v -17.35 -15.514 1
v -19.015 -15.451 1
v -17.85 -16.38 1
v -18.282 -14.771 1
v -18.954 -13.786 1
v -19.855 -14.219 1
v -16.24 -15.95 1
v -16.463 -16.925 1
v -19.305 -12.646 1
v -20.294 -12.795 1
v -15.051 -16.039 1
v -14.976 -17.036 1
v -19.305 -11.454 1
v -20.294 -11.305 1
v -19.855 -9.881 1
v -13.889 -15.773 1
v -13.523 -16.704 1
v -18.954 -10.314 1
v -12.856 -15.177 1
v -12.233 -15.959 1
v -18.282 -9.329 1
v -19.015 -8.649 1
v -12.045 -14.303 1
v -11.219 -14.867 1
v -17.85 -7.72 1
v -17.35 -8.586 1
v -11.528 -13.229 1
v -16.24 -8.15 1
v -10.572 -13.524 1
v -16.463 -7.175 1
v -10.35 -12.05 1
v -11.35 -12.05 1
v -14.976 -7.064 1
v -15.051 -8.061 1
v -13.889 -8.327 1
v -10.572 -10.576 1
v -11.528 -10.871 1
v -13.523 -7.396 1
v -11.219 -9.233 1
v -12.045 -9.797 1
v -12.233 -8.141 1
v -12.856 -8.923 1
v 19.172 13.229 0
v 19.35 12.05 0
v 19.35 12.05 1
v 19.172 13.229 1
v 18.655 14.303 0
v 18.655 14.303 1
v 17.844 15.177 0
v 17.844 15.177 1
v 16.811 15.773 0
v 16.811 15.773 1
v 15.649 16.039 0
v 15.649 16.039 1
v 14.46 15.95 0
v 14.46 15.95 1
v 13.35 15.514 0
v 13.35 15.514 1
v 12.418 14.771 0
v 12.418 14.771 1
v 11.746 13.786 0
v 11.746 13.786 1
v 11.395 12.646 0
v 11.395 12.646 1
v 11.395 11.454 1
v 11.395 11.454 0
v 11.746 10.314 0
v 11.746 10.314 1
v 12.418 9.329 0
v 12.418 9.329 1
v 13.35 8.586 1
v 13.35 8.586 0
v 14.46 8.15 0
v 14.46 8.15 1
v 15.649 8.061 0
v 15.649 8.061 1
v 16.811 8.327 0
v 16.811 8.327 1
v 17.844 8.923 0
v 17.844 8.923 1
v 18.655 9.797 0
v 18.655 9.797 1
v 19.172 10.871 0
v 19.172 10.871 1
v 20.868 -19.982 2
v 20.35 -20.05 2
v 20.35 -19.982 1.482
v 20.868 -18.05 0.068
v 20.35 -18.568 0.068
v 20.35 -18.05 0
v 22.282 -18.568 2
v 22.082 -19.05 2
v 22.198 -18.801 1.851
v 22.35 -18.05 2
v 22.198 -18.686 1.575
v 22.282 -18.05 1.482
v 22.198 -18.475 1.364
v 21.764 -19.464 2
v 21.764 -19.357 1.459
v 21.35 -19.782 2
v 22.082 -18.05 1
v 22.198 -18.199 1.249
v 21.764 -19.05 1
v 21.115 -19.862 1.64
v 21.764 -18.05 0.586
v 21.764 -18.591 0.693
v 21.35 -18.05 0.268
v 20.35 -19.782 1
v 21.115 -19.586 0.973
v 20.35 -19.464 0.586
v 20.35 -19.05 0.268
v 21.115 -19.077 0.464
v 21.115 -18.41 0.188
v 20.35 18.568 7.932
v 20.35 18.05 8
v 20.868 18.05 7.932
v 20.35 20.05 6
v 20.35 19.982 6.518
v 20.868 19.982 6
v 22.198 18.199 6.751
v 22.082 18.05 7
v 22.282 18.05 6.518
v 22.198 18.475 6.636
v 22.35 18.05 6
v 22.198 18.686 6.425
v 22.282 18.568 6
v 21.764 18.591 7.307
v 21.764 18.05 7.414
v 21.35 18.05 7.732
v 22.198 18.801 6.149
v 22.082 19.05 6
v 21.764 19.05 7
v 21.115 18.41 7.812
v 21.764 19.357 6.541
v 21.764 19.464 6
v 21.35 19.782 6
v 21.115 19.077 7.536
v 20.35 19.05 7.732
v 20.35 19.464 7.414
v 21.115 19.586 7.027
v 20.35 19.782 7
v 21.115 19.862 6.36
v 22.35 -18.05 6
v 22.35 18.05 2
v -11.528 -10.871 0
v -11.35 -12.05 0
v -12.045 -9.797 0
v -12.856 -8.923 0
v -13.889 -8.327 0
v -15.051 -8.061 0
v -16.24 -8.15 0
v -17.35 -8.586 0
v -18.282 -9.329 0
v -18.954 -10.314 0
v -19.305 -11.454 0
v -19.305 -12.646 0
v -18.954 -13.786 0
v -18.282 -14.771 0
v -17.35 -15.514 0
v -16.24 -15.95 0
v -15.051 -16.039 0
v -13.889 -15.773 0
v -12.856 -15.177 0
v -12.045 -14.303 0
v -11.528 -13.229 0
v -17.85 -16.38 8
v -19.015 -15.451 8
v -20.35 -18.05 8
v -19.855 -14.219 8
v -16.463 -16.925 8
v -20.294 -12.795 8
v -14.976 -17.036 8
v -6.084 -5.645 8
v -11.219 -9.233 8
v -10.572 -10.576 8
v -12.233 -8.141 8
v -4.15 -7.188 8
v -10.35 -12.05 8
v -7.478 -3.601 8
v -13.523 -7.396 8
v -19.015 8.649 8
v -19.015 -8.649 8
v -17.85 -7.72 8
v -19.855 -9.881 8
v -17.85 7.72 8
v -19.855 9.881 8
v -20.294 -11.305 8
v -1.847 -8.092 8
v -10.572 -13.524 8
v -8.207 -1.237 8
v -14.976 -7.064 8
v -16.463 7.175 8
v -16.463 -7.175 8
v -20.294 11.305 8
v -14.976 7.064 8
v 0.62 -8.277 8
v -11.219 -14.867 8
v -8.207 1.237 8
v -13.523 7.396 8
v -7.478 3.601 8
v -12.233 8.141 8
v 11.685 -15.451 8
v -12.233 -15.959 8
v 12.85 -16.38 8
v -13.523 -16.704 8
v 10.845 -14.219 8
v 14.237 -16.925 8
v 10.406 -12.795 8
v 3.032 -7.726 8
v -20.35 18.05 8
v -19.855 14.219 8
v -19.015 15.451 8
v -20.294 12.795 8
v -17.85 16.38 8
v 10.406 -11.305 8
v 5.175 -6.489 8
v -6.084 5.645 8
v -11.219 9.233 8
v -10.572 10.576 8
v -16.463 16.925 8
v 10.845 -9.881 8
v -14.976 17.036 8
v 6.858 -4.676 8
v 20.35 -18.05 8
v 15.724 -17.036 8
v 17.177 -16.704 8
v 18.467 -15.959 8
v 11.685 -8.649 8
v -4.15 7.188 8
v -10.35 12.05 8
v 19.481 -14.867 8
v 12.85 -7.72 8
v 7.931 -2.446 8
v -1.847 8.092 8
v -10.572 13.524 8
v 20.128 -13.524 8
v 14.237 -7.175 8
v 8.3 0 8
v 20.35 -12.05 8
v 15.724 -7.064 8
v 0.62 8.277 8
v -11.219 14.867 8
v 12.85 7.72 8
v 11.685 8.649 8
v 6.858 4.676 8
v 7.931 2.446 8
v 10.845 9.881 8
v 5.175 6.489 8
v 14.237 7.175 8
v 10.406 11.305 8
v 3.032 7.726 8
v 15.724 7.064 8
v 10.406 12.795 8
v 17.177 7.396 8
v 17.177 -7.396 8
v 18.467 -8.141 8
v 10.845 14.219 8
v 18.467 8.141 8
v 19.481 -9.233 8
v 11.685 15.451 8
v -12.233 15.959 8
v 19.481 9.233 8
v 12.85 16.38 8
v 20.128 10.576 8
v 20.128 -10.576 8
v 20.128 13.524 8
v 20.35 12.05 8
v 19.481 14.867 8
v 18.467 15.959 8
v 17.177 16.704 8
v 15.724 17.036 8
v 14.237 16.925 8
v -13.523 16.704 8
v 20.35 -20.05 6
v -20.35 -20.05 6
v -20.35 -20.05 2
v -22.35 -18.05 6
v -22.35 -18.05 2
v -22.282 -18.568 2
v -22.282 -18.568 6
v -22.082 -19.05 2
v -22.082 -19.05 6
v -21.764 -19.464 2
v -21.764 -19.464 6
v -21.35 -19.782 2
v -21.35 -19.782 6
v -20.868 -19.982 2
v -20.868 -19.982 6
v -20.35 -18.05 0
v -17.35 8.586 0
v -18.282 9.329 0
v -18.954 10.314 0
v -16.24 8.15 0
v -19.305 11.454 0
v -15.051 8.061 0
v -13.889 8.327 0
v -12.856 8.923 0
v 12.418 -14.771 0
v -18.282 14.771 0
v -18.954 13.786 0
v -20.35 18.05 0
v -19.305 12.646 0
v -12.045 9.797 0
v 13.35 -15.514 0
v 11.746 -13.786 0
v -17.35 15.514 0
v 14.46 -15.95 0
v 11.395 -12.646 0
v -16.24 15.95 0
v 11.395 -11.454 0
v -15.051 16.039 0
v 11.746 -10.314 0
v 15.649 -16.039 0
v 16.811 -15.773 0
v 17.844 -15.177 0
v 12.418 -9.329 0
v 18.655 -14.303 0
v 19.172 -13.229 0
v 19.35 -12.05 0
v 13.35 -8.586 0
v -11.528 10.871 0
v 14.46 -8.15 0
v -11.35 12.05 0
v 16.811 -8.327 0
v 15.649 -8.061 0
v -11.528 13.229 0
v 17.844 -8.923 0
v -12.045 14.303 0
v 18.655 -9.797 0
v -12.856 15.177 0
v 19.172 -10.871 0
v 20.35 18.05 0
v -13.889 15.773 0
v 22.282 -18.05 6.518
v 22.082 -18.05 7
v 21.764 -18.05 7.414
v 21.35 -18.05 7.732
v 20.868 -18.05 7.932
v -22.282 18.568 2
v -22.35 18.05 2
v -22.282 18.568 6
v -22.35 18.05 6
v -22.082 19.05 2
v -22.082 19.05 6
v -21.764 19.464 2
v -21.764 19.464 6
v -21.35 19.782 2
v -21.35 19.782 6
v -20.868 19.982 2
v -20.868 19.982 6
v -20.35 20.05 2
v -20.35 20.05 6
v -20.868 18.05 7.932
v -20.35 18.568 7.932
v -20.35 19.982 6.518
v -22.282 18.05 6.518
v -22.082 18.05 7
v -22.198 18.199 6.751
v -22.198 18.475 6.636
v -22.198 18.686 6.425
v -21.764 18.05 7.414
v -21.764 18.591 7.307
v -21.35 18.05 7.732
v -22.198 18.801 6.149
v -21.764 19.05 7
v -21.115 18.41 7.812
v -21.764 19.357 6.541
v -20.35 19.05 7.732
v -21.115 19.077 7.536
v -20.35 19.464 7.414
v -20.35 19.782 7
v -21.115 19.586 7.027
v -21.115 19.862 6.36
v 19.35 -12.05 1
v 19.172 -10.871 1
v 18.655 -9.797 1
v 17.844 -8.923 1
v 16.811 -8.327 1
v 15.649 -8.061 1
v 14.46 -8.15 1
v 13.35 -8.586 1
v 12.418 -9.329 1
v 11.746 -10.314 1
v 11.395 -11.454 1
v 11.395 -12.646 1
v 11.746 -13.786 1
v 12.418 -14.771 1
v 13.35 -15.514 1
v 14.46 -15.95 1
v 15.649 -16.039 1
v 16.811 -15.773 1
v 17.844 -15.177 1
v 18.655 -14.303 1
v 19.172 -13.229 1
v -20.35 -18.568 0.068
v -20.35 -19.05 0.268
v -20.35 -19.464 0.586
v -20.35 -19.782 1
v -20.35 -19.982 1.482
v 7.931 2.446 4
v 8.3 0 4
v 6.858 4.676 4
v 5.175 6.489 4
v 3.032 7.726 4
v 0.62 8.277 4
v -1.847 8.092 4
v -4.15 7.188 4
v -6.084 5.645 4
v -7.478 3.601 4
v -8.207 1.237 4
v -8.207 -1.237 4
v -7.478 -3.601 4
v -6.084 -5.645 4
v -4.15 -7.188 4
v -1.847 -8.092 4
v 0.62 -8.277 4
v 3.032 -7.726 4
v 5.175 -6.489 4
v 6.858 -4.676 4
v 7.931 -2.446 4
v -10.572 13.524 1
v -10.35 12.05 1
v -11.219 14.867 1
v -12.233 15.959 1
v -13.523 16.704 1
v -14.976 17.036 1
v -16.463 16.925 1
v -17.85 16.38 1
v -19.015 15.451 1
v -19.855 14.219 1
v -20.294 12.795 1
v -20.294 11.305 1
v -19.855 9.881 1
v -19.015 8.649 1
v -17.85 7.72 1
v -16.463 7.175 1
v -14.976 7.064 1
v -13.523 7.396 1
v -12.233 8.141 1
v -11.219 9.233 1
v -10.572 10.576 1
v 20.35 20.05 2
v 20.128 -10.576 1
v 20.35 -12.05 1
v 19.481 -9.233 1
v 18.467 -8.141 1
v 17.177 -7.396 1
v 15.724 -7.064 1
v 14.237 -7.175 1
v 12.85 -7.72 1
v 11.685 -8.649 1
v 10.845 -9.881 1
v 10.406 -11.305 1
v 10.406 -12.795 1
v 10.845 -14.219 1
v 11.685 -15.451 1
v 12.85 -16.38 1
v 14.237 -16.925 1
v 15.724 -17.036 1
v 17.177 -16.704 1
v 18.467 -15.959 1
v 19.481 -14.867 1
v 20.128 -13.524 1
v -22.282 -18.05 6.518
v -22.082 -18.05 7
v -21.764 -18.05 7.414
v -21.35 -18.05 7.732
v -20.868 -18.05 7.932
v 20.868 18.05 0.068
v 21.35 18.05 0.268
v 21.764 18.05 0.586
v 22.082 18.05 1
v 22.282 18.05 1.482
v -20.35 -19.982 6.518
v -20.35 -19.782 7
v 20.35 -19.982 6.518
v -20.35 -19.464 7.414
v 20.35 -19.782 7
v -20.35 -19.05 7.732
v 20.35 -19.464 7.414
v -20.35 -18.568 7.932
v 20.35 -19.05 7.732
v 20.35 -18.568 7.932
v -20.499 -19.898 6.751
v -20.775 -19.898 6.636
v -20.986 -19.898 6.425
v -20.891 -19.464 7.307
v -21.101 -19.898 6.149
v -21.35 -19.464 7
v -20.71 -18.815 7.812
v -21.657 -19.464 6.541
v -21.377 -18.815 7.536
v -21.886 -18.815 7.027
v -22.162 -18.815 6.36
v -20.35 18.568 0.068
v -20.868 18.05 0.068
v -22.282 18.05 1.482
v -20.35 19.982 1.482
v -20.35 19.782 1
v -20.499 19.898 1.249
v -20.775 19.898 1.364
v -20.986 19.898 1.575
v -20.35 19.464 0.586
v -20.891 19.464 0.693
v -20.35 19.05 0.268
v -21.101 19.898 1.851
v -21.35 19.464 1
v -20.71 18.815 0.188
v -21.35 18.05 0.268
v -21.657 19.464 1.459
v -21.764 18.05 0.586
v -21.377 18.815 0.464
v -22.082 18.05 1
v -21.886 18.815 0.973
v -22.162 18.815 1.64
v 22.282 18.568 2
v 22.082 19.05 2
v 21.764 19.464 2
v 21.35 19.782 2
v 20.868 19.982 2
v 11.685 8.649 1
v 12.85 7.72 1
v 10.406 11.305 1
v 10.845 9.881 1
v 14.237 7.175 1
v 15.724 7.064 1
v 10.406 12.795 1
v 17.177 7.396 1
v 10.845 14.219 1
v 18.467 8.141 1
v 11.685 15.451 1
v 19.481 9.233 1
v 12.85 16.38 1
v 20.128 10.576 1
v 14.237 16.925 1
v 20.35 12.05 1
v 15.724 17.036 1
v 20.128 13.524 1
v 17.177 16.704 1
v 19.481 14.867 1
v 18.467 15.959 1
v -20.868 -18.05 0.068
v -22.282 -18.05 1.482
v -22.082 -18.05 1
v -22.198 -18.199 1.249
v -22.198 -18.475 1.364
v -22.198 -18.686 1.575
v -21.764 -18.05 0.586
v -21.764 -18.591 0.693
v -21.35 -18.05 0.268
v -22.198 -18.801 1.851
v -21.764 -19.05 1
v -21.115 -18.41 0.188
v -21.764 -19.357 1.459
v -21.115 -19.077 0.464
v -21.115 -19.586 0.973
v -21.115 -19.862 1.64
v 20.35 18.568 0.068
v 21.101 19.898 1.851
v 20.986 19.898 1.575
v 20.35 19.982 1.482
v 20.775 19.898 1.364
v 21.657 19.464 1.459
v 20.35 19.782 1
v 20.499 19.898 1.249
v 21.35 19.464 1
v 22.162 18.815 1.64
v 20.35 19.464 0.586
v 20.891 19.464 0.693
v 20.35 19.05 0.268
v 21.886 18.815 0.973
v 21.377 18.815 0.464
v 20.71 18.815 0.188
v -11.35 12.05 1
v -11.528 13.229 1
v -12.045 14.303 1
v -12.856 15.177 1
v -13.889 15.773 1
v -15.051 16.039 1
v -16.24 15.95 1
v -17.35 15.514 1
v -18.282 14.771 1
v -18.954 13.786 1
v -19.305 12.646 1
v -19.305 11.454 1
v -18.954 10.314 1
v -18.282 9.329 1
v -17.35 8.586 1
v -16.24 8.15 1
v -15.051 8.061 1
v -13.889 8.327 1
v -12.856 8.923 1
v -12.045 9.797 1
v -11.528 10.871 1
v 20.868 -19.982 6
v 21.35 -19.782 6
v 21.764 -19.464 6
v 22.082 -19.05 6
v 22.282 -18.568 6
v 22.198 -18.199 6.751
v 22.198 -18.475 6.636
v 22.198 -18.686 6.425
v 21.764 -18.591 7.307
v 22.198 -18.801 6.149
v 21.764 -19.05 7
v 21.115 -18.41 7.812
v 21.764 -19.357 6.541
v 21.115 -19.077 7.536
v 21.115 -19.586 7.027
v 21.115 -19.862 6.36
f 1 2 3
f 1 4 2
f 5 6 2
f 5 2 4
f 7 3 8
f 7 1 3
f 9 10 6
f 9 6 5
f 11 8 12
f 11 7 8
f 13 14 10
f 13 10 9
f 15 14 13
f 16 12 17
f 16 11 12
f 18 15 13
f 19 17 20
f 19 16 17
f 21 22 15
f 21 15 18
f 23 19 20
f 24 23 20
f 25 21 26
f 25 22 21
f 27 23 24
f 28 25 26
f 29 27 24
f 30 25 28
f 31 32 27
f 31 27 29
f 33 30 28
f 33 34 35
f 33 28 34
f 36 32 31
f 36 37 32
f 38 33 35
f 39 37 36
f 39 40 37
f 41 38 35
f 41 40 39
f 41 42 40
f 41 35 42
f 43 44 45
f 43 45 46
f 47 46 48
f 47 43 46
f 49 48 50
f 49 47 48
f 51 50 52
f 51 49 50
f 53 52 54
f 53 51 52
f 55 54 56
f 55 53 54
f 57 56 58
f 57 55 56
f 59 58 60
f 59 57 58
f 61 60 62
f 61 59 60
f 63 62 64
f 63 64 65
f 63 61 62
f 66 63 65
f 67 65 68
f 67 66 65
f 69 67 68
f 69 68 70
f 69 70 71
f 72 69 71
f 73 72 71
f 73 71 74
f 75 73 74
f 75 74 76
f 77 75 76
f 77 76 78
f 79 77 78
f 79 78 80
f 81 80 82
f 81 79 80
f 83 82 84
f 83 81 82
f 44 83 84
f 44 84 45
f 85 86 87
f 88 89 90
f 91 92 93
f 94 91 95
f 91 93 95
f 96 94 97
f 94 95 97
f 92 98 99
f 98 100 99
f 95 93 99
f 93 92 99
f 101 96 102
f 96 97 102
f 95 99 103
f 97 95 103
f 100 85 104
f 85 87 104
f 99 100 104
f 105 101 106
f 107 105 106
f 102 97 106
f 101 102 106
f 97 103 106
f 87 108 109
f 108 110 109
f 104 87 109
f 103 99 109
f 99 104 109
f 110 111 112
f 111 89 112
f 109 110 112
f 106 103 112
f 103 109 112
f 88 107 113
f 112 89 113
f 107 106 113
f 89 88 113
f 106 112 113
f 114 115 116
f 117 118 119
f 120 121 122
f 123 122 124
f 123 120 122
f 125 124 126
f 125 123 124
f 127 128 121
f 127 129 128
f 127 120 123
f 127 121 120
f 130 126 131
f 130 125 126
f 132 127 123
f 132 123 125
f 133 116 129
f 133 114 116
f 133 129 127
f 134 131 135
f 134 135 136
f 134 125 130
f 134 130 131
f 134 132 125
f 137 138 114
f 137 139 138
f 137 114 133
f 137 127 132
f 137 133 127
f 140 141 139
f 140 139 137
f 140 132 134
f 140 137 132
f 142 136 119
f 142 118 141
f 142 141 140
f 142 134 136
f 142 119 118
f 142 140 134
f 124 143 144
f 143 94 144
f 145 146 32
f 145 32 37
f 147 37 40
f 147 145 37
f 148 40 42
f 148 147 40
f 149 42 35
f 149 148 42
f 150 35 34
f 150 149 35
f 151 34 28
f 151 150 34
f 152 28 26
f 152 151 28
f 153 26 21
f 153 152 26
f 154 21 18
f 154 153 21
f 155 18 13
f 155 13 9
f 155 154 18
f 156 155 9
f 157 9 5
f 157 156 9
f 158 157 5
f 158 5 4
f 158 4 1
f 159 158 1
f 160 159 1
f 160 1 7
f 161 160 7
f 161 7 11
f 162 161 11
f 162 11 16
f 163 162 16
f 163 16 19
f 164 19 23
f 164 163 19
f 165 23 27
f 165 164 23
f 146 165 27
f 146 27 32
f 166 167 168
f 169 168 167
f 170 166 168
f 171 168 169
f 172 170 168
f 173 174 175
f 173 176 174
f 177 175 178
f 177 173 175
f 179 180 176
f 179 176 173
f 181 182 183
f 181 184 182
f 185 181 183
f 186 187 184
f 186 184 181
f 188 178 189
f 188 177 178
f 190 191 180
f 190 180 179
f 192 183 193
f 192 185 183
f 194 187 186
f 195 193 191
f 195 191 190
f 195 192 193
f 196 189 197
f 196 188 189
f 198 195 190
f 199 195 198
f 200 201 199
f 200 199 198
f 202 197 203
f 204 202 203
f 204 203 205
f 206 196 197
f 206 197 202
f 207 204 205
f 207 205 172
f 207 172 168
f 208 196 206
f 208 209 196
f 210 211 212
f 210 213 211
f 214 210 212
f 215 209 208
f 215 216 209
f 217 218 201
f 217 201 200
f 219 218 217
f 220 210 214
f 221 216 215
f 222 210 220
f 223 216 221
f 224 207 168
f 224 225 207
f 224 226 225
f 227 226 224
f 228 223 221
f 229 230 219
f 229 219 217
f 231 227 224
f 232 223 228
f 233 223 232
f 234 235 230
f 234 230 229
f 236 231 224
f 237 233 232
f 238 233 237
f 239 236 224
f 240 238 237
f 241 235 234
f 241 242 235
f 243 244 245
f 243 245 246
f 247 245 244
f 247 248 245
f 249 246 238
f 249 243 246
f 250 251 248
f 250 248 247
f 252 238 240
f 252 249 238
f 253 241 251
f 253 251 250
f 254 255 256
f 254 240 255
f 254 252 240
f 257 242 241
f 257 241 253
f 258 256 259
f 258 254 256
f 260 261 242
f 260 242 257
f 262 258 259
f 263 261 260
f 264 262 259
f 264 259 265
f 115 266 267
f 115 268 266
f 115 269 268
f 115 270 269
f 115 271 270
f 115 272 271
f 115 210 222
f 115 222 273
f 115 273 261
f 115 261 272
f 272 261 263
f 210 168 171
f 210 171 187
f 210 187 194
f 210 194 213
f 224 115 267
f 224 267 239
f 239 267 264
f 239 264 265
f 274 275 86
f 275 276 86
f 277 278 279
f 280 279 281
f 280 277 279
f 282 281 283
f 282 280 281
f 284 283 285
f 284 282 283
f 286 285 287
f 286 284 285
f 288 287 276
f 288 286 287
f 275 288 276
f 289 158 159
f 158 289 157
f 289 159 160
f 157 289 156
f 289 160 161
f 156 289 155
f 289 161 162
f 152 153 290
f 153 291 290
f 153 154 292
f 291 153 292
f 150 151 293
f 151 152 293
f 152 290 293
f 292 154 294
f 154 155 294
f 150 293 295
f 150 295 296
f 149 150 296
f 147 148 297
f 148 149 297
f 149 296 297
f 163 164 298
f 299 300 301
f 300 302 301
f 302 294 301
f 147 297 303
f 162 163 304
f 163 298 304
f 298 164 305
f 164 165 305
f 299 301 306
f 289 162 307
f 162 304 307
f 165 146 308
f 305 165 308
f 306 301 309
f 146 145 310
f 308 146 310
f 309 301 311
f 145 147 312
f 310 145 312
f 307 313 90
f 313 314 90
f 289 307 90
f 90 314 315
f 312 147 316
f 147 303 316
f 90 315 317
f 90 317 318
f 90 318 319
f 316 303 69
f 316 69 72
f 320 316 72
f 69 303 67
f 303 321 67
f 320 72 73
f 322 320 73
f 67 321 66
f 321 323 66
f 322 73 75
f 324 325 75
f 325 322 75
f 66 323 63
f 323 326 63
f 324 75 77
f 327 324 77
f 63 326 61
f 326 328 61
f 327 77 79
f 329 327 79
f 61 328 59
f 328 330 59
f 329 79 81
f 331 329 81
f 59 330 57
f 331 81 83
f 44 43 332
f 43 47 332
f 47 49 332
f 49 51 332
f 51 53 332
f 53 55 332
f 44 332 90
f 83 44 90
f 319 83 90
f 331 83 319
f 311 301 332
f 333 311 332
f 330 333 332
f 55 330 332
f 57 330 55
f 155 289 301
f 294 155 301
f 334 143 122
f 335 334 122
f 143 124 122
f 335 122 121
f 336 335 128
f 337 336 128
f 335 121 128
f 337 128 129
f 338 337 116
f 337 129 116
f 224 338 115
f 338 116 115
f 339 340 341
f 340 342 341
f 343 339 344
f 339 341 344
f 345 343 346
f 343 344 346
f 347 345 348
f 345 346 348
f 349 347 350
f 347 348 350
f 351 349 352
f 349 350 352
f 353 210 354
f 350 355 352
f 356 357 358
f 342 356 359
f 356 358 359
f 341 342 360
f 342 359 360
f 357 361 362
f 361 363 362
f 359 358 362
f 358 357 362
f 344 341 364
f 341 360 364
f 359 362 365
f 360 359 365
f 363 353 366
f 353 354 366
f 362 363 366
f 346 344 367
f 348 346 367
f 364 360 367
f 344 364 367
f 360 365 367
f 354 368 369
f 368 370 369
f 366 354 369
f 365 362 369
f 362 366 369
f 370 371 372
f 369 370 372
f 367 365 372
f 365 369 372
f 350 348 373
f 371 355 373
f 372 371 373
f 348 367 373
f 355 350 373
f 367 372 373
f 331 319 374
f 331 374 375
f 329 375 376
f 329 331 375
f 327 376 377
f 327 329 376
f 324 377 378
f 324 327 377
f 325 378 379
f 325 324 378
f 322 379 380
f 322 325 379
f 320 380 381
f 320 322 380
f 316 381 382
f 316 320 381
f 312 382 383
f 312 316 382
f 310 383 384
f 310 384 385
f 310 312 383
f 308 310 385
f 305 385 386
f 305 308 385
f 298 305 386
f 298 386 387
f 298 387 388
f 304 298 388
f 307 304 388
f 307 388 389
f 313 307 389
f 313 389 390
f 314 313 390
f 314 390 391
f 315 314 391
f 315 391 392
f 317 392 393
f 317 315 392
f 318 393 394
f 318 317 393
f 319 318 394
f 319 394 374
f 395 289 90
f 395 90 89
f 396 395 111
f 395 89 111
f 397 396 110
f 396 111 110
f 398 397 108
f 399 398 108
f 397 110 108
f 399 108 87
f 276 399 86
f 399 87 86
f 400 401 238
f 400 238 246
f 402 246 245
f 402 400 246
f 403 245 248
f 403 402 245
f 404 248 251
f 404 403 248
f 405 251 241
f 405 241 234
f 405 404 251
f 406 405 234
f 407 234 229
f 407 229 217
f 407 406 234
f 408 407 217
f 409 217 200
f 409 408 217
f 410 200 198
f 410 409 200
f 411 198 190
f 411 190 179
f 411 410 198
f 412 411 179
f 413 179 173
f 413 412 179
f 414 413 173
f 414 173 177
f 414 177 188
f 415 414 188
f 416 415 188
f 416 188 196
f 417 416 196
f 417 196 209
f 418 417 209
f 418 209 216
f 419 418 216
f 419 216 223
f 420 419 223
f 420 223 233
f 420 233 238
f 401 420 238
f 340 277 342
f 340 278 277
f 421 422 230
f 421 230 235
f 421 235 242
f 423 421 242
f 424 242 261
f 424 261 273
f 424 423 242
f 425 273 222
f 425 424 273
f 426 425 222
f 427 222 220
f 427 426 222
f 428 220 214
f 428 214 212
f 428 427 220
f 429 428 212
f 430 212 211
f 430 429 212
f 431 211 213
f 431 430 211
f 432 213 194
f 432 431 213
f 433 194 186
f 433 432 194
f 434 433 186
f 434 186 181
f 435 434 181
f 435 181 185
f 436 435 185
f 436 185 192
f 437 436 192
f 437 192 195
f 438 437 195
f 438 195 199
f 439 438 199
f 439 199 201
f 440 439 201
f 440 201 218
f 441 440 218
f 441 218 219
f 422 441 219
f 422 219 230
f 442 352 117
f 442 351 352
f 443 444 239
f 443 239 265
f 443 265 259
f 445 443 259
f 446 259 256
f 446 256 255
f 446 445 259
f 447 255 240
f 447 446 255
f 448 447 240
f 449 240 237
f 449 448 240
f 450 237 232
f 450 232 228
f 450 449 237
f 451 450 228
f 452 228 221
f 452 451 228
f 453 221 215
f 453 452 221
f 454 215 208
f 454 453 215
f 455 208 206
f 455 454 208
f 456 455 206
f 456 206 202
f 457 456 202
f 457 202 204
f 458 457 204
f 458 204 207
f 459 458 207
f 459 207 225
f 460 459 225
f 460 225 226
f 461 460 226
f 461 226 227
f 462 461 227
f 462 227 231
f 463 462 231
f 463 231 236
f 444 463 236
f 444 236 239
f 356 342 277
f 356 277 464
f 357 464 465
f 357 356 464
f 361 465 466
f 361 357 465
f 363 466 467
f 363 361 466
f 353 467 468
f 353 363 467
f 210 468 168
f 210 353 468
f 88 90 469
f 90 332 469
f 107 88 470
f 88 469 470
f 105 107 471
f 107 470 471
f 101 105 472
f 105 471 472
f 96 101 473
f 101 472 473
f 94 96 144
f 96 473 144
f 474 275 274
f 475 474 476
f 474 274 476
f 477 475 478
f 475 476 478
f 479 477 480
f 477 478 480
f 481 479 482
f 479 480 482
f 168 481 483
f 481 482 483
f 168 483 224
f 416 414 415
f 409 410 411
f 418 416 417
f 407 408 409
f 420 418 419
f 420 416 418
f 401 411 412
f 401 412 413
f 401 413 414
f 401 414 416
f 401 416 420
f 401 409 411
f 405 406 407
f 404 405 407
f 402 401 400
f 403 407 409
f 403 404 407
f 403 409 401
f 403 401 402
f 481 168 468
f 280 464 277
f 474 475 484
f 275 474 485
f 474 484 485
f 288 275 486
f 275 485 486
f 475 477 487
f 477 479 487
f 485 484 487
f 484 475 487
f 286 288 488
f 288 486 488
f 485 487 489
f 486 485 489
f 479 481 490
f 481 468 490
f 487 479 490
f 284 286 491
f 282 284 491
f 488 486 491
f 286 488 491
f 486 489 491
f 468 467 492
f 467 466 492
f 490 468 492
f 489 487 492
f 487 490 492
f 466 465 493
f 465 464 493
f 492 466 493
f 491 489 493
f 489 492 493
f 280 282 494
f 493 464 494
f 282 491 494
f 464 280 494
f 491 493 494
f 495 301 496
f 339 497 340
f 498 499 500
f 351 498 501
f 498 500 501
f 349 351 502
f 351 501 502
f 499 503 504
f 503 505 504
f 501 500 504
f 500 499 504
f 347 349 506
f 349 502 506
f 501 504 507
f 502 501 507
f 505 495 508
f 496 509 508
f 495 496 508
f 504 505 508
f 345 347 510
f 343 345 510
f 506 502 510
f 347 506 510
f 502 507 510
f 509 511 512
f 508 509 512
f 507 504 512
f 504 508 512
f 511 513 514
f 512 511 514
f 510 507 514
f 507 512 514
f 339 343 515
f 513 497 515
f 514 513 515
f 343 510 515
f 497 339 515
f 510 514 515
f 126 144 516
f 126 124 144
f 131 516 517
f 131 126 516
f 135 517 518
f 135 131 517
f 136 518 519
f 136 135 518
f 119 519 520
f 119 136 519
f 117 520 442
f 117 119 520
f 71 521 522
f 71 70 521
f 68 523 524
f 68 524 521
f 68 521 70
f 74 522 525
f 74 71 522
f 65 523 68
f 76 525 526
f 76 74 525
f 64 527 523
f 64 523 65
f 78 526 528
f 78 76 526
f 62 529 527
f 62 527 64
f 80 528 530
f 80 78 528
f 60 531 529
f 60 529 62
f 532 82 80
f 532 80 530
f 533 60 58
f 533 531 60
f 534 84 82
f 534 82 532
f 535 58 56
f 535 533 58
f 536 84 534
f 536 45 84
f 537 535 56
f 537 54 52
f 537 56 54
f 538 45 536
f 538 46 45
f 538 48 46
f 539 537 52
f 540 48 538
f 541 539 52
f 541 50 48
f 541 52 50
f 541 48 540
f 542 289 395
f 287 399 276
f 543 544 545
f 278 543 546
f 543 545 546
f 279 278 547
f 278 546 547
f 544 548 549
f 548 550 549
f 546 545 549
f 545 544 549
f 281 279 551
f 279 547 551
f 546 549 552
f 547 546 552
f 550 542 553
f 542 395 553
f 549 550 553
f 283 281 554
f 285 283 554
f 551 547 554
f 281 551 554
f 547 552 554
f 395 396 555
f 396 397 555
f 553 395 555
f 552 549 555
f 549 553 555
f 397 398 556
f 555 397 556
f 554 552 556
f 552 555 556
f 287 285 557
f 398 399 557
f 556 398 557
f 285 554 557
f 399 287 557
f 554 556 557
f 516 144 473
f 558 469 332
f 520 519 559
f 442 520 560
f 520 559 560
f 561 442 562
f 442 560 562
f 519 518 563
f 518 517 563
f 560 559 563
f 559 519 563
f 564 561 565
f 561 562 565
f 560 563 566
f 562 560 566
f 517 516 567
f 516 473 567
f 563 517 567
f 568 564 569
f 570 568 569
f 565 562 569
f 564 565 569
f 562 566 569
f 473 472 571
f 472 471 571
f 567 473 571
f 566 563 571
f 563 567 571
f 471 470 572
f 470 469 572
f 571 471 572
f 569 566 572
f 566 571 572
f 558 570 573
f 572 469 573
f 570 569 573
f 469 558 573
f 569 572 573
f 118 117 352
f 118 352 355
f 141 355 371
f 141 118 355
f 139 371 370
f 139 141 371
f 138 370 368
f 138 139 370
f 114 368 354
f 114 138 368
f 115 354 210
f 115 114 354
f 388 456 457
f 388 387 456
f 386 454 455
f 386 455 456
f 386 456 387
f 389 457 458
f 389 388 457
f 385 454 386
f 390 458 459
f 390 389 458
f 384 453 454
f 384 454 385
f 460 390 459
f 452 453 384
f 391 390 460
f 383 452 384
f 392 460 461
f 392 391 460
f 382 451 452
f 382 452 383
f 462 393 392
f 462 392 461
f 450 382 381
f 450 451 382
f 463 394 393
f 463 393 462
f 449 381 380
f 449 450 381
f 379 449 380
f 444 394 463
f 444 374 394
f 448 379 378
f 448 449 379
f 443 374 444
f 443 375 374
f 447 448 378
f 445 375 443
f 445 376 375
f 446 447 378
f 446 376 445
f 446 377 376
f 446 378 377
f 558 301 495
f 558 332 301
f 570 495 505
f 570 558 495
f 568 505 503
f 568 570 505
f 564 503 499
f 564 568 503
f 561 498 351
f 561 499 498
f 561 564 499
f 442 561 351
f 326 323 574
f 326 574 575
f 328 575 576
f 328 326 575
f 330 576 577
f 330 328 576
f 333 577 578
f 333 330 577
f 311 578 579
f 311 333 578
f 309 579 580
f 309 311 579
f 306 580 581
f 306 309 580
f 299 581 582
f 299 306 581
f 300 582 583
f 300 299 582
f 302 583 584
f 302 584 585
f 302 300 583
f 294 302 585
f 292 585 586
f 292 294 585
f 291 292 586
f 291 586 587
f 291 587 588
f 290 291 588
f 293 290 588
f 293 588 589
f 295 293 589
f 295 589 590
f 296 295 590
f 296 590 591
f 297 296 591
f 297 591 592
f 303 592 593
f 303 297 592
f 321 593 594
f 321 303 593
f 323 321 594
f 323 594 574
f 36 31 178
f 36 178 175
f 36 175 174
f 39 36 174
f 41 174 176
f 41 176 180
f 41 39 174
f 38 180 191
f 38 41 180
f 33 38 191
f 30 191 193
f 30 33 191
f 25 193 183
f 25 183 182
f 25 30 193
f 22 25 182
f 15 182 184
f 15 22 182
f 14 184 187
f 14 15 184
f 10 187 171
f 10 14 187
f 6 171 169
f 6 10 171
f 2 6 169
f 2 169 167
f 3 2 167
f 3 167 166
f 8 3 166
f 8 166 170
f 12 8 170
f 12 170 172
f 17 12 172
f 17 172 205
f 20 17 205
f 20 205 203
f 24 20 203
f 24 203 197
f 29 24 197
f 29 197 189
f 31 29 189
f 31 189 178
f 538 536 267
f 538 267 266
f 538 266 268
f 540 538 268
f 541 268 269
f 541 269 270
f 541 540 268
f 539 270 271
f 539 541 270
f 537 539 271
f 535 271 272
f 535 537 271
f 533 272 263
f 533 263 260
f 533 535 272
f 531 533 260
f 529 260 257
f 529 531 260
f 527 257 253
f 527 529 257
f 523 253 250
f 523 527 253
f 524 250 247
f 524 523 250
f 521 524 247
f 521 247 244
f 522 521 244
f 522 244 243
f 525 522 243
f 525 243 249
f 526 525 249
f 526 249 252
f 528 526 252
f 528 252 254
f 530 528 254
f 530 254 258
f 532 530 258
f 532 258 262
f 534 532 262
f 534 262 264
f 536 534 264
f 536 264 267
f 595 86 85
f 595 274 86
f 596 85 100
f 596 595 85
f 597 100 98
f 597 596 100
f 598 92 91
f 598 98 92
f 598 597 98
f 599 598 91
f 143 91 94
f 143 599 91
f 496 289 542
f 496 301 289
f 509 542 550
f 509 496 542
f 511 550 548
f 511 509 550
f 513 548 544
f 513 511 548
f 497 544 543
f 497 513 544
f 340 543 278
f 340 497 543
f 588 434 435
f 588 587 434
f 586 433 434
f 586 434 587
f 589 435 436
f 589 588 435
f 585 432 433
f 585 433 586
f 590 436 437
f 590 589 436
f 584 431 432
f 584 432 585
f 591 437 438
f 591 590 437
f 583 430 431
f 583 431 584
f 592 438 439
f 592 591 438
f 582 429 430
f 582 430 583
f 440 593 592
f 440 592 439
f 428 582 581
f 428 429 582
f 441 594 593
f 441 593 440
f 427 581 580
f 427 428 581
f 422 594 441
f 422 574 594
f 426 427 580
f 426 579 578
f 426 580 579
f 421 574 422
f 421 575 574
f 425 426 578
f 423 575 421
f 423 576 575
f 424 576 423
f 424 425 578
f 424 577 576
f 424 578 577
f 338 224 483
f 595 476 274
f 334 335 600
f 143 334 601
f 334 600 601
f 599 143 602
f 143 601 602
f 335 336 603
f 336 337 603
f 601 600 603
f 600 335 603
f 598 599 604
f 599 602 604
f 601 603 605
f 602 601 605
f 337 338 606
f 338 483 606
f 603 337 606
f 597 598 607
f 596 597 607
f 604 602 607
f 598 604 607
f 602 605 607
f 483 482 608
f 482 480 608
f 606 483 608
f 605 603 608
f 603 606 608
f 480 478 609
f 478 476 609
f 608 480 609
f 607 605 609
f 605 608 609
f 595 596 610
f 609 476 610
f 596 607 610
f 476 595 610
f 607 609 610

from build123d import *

# Parameters (mm, degrees)
F0_W     = 44.7
F0_H     = 40.1
F0_R     = 5
F0_R_2   = 8.3
F1_DEPTH = 8
F2_DEPTH = 4
F0_R_3   = 4
F3_DEPTH = 1
F4_R     = 1.99999


# Not quite as in the source:
# - a fillet or chamfer is up to 0.001 mm smaller than in the source, because OpenCascade refuses the exact size


with BuildPart() as f1:
    # F0 (on Top) → F1 (new body)
    with BuildSketch(Plane.XY):
        Rectangle(F0_W, F0_H)
        with Locations((-15.35, -12.05)):
            Circle(F0_R, mode=Mode.SUBTRACT)
        with Locations((15.35, -12.05)):
            Circle(F0_R, mode=Mode.SUBTRACT)
        Circle(F0_R_2, mode=Mode.SUBTRACT)
        with Locations((-15.35, 12.05)):
            Circle(F0_R, mode=Mode.SUBTRACT)
        with Locations((15.35, 12.05)):
            Circle(F0_R, mode=Mode.SUBTRACT)
    extrude(amount=F1_DEPTH)

    # F0 (on Top) → F2 (join)
    with BuildSketch(Plane.XY):
        Circle(F0_R_2)
    extrude(amount=F2_DEPTH)

    # F0 (on Top) → F3 (join)
    with BuildSketch(Plane.XY):
        with Locations((15.35, 12.05)):
            Circle(F0_R)
        with Locations((15.35, 12.05)):
            Circle(F0_R_3, mode=Mode.SUBTRACT)
        with Locations((15.35, -12.05)):
            Circle(F0_R)
        with Locations((15.35, -12.05)):
            Circle(F0_R_3, mode=Mode.SUBTRACT)
        with Locations((-15.35, -12.05)):
            Circle(F0_R)
        with Locations((-15.35, -12.05)):
            Circle(F0_R_3, mode=Mode.SUBTRACT)
        with Locations((-15.35, 12.05)):
            Circle(F0_R)
        with Locations((-15.35, 12.05)):
            Circle(F0_R_3, mode=Mode.SUBTRACT)
    extrude(amount=F3_DEPTH)

    # F4 (radius 2 in the source; OpenCascade refuses exactly that, so slightly less here)
    f4_edges = [f1.edges().sort_by_distance(p)[0] for p in [
        (0, 20.05, 8),
        (-22.35, 0, 8),
        (0, -20.05, 8),
        (22.35, 0, 8),
        (0, -20.05, 0),
        (-22.35, 0, 0),
        (-22.35, -20.05, 4),
        (22.35, -20.05, 4),
        (22.35, 0, 0),
        (22.35, 20.05, 4),
        (0, 20.05, 0),
        (-22.35, 20.05, 4),
    ]]
    fillet(f4_edges, radius=F4_R)


solid = f1.part
